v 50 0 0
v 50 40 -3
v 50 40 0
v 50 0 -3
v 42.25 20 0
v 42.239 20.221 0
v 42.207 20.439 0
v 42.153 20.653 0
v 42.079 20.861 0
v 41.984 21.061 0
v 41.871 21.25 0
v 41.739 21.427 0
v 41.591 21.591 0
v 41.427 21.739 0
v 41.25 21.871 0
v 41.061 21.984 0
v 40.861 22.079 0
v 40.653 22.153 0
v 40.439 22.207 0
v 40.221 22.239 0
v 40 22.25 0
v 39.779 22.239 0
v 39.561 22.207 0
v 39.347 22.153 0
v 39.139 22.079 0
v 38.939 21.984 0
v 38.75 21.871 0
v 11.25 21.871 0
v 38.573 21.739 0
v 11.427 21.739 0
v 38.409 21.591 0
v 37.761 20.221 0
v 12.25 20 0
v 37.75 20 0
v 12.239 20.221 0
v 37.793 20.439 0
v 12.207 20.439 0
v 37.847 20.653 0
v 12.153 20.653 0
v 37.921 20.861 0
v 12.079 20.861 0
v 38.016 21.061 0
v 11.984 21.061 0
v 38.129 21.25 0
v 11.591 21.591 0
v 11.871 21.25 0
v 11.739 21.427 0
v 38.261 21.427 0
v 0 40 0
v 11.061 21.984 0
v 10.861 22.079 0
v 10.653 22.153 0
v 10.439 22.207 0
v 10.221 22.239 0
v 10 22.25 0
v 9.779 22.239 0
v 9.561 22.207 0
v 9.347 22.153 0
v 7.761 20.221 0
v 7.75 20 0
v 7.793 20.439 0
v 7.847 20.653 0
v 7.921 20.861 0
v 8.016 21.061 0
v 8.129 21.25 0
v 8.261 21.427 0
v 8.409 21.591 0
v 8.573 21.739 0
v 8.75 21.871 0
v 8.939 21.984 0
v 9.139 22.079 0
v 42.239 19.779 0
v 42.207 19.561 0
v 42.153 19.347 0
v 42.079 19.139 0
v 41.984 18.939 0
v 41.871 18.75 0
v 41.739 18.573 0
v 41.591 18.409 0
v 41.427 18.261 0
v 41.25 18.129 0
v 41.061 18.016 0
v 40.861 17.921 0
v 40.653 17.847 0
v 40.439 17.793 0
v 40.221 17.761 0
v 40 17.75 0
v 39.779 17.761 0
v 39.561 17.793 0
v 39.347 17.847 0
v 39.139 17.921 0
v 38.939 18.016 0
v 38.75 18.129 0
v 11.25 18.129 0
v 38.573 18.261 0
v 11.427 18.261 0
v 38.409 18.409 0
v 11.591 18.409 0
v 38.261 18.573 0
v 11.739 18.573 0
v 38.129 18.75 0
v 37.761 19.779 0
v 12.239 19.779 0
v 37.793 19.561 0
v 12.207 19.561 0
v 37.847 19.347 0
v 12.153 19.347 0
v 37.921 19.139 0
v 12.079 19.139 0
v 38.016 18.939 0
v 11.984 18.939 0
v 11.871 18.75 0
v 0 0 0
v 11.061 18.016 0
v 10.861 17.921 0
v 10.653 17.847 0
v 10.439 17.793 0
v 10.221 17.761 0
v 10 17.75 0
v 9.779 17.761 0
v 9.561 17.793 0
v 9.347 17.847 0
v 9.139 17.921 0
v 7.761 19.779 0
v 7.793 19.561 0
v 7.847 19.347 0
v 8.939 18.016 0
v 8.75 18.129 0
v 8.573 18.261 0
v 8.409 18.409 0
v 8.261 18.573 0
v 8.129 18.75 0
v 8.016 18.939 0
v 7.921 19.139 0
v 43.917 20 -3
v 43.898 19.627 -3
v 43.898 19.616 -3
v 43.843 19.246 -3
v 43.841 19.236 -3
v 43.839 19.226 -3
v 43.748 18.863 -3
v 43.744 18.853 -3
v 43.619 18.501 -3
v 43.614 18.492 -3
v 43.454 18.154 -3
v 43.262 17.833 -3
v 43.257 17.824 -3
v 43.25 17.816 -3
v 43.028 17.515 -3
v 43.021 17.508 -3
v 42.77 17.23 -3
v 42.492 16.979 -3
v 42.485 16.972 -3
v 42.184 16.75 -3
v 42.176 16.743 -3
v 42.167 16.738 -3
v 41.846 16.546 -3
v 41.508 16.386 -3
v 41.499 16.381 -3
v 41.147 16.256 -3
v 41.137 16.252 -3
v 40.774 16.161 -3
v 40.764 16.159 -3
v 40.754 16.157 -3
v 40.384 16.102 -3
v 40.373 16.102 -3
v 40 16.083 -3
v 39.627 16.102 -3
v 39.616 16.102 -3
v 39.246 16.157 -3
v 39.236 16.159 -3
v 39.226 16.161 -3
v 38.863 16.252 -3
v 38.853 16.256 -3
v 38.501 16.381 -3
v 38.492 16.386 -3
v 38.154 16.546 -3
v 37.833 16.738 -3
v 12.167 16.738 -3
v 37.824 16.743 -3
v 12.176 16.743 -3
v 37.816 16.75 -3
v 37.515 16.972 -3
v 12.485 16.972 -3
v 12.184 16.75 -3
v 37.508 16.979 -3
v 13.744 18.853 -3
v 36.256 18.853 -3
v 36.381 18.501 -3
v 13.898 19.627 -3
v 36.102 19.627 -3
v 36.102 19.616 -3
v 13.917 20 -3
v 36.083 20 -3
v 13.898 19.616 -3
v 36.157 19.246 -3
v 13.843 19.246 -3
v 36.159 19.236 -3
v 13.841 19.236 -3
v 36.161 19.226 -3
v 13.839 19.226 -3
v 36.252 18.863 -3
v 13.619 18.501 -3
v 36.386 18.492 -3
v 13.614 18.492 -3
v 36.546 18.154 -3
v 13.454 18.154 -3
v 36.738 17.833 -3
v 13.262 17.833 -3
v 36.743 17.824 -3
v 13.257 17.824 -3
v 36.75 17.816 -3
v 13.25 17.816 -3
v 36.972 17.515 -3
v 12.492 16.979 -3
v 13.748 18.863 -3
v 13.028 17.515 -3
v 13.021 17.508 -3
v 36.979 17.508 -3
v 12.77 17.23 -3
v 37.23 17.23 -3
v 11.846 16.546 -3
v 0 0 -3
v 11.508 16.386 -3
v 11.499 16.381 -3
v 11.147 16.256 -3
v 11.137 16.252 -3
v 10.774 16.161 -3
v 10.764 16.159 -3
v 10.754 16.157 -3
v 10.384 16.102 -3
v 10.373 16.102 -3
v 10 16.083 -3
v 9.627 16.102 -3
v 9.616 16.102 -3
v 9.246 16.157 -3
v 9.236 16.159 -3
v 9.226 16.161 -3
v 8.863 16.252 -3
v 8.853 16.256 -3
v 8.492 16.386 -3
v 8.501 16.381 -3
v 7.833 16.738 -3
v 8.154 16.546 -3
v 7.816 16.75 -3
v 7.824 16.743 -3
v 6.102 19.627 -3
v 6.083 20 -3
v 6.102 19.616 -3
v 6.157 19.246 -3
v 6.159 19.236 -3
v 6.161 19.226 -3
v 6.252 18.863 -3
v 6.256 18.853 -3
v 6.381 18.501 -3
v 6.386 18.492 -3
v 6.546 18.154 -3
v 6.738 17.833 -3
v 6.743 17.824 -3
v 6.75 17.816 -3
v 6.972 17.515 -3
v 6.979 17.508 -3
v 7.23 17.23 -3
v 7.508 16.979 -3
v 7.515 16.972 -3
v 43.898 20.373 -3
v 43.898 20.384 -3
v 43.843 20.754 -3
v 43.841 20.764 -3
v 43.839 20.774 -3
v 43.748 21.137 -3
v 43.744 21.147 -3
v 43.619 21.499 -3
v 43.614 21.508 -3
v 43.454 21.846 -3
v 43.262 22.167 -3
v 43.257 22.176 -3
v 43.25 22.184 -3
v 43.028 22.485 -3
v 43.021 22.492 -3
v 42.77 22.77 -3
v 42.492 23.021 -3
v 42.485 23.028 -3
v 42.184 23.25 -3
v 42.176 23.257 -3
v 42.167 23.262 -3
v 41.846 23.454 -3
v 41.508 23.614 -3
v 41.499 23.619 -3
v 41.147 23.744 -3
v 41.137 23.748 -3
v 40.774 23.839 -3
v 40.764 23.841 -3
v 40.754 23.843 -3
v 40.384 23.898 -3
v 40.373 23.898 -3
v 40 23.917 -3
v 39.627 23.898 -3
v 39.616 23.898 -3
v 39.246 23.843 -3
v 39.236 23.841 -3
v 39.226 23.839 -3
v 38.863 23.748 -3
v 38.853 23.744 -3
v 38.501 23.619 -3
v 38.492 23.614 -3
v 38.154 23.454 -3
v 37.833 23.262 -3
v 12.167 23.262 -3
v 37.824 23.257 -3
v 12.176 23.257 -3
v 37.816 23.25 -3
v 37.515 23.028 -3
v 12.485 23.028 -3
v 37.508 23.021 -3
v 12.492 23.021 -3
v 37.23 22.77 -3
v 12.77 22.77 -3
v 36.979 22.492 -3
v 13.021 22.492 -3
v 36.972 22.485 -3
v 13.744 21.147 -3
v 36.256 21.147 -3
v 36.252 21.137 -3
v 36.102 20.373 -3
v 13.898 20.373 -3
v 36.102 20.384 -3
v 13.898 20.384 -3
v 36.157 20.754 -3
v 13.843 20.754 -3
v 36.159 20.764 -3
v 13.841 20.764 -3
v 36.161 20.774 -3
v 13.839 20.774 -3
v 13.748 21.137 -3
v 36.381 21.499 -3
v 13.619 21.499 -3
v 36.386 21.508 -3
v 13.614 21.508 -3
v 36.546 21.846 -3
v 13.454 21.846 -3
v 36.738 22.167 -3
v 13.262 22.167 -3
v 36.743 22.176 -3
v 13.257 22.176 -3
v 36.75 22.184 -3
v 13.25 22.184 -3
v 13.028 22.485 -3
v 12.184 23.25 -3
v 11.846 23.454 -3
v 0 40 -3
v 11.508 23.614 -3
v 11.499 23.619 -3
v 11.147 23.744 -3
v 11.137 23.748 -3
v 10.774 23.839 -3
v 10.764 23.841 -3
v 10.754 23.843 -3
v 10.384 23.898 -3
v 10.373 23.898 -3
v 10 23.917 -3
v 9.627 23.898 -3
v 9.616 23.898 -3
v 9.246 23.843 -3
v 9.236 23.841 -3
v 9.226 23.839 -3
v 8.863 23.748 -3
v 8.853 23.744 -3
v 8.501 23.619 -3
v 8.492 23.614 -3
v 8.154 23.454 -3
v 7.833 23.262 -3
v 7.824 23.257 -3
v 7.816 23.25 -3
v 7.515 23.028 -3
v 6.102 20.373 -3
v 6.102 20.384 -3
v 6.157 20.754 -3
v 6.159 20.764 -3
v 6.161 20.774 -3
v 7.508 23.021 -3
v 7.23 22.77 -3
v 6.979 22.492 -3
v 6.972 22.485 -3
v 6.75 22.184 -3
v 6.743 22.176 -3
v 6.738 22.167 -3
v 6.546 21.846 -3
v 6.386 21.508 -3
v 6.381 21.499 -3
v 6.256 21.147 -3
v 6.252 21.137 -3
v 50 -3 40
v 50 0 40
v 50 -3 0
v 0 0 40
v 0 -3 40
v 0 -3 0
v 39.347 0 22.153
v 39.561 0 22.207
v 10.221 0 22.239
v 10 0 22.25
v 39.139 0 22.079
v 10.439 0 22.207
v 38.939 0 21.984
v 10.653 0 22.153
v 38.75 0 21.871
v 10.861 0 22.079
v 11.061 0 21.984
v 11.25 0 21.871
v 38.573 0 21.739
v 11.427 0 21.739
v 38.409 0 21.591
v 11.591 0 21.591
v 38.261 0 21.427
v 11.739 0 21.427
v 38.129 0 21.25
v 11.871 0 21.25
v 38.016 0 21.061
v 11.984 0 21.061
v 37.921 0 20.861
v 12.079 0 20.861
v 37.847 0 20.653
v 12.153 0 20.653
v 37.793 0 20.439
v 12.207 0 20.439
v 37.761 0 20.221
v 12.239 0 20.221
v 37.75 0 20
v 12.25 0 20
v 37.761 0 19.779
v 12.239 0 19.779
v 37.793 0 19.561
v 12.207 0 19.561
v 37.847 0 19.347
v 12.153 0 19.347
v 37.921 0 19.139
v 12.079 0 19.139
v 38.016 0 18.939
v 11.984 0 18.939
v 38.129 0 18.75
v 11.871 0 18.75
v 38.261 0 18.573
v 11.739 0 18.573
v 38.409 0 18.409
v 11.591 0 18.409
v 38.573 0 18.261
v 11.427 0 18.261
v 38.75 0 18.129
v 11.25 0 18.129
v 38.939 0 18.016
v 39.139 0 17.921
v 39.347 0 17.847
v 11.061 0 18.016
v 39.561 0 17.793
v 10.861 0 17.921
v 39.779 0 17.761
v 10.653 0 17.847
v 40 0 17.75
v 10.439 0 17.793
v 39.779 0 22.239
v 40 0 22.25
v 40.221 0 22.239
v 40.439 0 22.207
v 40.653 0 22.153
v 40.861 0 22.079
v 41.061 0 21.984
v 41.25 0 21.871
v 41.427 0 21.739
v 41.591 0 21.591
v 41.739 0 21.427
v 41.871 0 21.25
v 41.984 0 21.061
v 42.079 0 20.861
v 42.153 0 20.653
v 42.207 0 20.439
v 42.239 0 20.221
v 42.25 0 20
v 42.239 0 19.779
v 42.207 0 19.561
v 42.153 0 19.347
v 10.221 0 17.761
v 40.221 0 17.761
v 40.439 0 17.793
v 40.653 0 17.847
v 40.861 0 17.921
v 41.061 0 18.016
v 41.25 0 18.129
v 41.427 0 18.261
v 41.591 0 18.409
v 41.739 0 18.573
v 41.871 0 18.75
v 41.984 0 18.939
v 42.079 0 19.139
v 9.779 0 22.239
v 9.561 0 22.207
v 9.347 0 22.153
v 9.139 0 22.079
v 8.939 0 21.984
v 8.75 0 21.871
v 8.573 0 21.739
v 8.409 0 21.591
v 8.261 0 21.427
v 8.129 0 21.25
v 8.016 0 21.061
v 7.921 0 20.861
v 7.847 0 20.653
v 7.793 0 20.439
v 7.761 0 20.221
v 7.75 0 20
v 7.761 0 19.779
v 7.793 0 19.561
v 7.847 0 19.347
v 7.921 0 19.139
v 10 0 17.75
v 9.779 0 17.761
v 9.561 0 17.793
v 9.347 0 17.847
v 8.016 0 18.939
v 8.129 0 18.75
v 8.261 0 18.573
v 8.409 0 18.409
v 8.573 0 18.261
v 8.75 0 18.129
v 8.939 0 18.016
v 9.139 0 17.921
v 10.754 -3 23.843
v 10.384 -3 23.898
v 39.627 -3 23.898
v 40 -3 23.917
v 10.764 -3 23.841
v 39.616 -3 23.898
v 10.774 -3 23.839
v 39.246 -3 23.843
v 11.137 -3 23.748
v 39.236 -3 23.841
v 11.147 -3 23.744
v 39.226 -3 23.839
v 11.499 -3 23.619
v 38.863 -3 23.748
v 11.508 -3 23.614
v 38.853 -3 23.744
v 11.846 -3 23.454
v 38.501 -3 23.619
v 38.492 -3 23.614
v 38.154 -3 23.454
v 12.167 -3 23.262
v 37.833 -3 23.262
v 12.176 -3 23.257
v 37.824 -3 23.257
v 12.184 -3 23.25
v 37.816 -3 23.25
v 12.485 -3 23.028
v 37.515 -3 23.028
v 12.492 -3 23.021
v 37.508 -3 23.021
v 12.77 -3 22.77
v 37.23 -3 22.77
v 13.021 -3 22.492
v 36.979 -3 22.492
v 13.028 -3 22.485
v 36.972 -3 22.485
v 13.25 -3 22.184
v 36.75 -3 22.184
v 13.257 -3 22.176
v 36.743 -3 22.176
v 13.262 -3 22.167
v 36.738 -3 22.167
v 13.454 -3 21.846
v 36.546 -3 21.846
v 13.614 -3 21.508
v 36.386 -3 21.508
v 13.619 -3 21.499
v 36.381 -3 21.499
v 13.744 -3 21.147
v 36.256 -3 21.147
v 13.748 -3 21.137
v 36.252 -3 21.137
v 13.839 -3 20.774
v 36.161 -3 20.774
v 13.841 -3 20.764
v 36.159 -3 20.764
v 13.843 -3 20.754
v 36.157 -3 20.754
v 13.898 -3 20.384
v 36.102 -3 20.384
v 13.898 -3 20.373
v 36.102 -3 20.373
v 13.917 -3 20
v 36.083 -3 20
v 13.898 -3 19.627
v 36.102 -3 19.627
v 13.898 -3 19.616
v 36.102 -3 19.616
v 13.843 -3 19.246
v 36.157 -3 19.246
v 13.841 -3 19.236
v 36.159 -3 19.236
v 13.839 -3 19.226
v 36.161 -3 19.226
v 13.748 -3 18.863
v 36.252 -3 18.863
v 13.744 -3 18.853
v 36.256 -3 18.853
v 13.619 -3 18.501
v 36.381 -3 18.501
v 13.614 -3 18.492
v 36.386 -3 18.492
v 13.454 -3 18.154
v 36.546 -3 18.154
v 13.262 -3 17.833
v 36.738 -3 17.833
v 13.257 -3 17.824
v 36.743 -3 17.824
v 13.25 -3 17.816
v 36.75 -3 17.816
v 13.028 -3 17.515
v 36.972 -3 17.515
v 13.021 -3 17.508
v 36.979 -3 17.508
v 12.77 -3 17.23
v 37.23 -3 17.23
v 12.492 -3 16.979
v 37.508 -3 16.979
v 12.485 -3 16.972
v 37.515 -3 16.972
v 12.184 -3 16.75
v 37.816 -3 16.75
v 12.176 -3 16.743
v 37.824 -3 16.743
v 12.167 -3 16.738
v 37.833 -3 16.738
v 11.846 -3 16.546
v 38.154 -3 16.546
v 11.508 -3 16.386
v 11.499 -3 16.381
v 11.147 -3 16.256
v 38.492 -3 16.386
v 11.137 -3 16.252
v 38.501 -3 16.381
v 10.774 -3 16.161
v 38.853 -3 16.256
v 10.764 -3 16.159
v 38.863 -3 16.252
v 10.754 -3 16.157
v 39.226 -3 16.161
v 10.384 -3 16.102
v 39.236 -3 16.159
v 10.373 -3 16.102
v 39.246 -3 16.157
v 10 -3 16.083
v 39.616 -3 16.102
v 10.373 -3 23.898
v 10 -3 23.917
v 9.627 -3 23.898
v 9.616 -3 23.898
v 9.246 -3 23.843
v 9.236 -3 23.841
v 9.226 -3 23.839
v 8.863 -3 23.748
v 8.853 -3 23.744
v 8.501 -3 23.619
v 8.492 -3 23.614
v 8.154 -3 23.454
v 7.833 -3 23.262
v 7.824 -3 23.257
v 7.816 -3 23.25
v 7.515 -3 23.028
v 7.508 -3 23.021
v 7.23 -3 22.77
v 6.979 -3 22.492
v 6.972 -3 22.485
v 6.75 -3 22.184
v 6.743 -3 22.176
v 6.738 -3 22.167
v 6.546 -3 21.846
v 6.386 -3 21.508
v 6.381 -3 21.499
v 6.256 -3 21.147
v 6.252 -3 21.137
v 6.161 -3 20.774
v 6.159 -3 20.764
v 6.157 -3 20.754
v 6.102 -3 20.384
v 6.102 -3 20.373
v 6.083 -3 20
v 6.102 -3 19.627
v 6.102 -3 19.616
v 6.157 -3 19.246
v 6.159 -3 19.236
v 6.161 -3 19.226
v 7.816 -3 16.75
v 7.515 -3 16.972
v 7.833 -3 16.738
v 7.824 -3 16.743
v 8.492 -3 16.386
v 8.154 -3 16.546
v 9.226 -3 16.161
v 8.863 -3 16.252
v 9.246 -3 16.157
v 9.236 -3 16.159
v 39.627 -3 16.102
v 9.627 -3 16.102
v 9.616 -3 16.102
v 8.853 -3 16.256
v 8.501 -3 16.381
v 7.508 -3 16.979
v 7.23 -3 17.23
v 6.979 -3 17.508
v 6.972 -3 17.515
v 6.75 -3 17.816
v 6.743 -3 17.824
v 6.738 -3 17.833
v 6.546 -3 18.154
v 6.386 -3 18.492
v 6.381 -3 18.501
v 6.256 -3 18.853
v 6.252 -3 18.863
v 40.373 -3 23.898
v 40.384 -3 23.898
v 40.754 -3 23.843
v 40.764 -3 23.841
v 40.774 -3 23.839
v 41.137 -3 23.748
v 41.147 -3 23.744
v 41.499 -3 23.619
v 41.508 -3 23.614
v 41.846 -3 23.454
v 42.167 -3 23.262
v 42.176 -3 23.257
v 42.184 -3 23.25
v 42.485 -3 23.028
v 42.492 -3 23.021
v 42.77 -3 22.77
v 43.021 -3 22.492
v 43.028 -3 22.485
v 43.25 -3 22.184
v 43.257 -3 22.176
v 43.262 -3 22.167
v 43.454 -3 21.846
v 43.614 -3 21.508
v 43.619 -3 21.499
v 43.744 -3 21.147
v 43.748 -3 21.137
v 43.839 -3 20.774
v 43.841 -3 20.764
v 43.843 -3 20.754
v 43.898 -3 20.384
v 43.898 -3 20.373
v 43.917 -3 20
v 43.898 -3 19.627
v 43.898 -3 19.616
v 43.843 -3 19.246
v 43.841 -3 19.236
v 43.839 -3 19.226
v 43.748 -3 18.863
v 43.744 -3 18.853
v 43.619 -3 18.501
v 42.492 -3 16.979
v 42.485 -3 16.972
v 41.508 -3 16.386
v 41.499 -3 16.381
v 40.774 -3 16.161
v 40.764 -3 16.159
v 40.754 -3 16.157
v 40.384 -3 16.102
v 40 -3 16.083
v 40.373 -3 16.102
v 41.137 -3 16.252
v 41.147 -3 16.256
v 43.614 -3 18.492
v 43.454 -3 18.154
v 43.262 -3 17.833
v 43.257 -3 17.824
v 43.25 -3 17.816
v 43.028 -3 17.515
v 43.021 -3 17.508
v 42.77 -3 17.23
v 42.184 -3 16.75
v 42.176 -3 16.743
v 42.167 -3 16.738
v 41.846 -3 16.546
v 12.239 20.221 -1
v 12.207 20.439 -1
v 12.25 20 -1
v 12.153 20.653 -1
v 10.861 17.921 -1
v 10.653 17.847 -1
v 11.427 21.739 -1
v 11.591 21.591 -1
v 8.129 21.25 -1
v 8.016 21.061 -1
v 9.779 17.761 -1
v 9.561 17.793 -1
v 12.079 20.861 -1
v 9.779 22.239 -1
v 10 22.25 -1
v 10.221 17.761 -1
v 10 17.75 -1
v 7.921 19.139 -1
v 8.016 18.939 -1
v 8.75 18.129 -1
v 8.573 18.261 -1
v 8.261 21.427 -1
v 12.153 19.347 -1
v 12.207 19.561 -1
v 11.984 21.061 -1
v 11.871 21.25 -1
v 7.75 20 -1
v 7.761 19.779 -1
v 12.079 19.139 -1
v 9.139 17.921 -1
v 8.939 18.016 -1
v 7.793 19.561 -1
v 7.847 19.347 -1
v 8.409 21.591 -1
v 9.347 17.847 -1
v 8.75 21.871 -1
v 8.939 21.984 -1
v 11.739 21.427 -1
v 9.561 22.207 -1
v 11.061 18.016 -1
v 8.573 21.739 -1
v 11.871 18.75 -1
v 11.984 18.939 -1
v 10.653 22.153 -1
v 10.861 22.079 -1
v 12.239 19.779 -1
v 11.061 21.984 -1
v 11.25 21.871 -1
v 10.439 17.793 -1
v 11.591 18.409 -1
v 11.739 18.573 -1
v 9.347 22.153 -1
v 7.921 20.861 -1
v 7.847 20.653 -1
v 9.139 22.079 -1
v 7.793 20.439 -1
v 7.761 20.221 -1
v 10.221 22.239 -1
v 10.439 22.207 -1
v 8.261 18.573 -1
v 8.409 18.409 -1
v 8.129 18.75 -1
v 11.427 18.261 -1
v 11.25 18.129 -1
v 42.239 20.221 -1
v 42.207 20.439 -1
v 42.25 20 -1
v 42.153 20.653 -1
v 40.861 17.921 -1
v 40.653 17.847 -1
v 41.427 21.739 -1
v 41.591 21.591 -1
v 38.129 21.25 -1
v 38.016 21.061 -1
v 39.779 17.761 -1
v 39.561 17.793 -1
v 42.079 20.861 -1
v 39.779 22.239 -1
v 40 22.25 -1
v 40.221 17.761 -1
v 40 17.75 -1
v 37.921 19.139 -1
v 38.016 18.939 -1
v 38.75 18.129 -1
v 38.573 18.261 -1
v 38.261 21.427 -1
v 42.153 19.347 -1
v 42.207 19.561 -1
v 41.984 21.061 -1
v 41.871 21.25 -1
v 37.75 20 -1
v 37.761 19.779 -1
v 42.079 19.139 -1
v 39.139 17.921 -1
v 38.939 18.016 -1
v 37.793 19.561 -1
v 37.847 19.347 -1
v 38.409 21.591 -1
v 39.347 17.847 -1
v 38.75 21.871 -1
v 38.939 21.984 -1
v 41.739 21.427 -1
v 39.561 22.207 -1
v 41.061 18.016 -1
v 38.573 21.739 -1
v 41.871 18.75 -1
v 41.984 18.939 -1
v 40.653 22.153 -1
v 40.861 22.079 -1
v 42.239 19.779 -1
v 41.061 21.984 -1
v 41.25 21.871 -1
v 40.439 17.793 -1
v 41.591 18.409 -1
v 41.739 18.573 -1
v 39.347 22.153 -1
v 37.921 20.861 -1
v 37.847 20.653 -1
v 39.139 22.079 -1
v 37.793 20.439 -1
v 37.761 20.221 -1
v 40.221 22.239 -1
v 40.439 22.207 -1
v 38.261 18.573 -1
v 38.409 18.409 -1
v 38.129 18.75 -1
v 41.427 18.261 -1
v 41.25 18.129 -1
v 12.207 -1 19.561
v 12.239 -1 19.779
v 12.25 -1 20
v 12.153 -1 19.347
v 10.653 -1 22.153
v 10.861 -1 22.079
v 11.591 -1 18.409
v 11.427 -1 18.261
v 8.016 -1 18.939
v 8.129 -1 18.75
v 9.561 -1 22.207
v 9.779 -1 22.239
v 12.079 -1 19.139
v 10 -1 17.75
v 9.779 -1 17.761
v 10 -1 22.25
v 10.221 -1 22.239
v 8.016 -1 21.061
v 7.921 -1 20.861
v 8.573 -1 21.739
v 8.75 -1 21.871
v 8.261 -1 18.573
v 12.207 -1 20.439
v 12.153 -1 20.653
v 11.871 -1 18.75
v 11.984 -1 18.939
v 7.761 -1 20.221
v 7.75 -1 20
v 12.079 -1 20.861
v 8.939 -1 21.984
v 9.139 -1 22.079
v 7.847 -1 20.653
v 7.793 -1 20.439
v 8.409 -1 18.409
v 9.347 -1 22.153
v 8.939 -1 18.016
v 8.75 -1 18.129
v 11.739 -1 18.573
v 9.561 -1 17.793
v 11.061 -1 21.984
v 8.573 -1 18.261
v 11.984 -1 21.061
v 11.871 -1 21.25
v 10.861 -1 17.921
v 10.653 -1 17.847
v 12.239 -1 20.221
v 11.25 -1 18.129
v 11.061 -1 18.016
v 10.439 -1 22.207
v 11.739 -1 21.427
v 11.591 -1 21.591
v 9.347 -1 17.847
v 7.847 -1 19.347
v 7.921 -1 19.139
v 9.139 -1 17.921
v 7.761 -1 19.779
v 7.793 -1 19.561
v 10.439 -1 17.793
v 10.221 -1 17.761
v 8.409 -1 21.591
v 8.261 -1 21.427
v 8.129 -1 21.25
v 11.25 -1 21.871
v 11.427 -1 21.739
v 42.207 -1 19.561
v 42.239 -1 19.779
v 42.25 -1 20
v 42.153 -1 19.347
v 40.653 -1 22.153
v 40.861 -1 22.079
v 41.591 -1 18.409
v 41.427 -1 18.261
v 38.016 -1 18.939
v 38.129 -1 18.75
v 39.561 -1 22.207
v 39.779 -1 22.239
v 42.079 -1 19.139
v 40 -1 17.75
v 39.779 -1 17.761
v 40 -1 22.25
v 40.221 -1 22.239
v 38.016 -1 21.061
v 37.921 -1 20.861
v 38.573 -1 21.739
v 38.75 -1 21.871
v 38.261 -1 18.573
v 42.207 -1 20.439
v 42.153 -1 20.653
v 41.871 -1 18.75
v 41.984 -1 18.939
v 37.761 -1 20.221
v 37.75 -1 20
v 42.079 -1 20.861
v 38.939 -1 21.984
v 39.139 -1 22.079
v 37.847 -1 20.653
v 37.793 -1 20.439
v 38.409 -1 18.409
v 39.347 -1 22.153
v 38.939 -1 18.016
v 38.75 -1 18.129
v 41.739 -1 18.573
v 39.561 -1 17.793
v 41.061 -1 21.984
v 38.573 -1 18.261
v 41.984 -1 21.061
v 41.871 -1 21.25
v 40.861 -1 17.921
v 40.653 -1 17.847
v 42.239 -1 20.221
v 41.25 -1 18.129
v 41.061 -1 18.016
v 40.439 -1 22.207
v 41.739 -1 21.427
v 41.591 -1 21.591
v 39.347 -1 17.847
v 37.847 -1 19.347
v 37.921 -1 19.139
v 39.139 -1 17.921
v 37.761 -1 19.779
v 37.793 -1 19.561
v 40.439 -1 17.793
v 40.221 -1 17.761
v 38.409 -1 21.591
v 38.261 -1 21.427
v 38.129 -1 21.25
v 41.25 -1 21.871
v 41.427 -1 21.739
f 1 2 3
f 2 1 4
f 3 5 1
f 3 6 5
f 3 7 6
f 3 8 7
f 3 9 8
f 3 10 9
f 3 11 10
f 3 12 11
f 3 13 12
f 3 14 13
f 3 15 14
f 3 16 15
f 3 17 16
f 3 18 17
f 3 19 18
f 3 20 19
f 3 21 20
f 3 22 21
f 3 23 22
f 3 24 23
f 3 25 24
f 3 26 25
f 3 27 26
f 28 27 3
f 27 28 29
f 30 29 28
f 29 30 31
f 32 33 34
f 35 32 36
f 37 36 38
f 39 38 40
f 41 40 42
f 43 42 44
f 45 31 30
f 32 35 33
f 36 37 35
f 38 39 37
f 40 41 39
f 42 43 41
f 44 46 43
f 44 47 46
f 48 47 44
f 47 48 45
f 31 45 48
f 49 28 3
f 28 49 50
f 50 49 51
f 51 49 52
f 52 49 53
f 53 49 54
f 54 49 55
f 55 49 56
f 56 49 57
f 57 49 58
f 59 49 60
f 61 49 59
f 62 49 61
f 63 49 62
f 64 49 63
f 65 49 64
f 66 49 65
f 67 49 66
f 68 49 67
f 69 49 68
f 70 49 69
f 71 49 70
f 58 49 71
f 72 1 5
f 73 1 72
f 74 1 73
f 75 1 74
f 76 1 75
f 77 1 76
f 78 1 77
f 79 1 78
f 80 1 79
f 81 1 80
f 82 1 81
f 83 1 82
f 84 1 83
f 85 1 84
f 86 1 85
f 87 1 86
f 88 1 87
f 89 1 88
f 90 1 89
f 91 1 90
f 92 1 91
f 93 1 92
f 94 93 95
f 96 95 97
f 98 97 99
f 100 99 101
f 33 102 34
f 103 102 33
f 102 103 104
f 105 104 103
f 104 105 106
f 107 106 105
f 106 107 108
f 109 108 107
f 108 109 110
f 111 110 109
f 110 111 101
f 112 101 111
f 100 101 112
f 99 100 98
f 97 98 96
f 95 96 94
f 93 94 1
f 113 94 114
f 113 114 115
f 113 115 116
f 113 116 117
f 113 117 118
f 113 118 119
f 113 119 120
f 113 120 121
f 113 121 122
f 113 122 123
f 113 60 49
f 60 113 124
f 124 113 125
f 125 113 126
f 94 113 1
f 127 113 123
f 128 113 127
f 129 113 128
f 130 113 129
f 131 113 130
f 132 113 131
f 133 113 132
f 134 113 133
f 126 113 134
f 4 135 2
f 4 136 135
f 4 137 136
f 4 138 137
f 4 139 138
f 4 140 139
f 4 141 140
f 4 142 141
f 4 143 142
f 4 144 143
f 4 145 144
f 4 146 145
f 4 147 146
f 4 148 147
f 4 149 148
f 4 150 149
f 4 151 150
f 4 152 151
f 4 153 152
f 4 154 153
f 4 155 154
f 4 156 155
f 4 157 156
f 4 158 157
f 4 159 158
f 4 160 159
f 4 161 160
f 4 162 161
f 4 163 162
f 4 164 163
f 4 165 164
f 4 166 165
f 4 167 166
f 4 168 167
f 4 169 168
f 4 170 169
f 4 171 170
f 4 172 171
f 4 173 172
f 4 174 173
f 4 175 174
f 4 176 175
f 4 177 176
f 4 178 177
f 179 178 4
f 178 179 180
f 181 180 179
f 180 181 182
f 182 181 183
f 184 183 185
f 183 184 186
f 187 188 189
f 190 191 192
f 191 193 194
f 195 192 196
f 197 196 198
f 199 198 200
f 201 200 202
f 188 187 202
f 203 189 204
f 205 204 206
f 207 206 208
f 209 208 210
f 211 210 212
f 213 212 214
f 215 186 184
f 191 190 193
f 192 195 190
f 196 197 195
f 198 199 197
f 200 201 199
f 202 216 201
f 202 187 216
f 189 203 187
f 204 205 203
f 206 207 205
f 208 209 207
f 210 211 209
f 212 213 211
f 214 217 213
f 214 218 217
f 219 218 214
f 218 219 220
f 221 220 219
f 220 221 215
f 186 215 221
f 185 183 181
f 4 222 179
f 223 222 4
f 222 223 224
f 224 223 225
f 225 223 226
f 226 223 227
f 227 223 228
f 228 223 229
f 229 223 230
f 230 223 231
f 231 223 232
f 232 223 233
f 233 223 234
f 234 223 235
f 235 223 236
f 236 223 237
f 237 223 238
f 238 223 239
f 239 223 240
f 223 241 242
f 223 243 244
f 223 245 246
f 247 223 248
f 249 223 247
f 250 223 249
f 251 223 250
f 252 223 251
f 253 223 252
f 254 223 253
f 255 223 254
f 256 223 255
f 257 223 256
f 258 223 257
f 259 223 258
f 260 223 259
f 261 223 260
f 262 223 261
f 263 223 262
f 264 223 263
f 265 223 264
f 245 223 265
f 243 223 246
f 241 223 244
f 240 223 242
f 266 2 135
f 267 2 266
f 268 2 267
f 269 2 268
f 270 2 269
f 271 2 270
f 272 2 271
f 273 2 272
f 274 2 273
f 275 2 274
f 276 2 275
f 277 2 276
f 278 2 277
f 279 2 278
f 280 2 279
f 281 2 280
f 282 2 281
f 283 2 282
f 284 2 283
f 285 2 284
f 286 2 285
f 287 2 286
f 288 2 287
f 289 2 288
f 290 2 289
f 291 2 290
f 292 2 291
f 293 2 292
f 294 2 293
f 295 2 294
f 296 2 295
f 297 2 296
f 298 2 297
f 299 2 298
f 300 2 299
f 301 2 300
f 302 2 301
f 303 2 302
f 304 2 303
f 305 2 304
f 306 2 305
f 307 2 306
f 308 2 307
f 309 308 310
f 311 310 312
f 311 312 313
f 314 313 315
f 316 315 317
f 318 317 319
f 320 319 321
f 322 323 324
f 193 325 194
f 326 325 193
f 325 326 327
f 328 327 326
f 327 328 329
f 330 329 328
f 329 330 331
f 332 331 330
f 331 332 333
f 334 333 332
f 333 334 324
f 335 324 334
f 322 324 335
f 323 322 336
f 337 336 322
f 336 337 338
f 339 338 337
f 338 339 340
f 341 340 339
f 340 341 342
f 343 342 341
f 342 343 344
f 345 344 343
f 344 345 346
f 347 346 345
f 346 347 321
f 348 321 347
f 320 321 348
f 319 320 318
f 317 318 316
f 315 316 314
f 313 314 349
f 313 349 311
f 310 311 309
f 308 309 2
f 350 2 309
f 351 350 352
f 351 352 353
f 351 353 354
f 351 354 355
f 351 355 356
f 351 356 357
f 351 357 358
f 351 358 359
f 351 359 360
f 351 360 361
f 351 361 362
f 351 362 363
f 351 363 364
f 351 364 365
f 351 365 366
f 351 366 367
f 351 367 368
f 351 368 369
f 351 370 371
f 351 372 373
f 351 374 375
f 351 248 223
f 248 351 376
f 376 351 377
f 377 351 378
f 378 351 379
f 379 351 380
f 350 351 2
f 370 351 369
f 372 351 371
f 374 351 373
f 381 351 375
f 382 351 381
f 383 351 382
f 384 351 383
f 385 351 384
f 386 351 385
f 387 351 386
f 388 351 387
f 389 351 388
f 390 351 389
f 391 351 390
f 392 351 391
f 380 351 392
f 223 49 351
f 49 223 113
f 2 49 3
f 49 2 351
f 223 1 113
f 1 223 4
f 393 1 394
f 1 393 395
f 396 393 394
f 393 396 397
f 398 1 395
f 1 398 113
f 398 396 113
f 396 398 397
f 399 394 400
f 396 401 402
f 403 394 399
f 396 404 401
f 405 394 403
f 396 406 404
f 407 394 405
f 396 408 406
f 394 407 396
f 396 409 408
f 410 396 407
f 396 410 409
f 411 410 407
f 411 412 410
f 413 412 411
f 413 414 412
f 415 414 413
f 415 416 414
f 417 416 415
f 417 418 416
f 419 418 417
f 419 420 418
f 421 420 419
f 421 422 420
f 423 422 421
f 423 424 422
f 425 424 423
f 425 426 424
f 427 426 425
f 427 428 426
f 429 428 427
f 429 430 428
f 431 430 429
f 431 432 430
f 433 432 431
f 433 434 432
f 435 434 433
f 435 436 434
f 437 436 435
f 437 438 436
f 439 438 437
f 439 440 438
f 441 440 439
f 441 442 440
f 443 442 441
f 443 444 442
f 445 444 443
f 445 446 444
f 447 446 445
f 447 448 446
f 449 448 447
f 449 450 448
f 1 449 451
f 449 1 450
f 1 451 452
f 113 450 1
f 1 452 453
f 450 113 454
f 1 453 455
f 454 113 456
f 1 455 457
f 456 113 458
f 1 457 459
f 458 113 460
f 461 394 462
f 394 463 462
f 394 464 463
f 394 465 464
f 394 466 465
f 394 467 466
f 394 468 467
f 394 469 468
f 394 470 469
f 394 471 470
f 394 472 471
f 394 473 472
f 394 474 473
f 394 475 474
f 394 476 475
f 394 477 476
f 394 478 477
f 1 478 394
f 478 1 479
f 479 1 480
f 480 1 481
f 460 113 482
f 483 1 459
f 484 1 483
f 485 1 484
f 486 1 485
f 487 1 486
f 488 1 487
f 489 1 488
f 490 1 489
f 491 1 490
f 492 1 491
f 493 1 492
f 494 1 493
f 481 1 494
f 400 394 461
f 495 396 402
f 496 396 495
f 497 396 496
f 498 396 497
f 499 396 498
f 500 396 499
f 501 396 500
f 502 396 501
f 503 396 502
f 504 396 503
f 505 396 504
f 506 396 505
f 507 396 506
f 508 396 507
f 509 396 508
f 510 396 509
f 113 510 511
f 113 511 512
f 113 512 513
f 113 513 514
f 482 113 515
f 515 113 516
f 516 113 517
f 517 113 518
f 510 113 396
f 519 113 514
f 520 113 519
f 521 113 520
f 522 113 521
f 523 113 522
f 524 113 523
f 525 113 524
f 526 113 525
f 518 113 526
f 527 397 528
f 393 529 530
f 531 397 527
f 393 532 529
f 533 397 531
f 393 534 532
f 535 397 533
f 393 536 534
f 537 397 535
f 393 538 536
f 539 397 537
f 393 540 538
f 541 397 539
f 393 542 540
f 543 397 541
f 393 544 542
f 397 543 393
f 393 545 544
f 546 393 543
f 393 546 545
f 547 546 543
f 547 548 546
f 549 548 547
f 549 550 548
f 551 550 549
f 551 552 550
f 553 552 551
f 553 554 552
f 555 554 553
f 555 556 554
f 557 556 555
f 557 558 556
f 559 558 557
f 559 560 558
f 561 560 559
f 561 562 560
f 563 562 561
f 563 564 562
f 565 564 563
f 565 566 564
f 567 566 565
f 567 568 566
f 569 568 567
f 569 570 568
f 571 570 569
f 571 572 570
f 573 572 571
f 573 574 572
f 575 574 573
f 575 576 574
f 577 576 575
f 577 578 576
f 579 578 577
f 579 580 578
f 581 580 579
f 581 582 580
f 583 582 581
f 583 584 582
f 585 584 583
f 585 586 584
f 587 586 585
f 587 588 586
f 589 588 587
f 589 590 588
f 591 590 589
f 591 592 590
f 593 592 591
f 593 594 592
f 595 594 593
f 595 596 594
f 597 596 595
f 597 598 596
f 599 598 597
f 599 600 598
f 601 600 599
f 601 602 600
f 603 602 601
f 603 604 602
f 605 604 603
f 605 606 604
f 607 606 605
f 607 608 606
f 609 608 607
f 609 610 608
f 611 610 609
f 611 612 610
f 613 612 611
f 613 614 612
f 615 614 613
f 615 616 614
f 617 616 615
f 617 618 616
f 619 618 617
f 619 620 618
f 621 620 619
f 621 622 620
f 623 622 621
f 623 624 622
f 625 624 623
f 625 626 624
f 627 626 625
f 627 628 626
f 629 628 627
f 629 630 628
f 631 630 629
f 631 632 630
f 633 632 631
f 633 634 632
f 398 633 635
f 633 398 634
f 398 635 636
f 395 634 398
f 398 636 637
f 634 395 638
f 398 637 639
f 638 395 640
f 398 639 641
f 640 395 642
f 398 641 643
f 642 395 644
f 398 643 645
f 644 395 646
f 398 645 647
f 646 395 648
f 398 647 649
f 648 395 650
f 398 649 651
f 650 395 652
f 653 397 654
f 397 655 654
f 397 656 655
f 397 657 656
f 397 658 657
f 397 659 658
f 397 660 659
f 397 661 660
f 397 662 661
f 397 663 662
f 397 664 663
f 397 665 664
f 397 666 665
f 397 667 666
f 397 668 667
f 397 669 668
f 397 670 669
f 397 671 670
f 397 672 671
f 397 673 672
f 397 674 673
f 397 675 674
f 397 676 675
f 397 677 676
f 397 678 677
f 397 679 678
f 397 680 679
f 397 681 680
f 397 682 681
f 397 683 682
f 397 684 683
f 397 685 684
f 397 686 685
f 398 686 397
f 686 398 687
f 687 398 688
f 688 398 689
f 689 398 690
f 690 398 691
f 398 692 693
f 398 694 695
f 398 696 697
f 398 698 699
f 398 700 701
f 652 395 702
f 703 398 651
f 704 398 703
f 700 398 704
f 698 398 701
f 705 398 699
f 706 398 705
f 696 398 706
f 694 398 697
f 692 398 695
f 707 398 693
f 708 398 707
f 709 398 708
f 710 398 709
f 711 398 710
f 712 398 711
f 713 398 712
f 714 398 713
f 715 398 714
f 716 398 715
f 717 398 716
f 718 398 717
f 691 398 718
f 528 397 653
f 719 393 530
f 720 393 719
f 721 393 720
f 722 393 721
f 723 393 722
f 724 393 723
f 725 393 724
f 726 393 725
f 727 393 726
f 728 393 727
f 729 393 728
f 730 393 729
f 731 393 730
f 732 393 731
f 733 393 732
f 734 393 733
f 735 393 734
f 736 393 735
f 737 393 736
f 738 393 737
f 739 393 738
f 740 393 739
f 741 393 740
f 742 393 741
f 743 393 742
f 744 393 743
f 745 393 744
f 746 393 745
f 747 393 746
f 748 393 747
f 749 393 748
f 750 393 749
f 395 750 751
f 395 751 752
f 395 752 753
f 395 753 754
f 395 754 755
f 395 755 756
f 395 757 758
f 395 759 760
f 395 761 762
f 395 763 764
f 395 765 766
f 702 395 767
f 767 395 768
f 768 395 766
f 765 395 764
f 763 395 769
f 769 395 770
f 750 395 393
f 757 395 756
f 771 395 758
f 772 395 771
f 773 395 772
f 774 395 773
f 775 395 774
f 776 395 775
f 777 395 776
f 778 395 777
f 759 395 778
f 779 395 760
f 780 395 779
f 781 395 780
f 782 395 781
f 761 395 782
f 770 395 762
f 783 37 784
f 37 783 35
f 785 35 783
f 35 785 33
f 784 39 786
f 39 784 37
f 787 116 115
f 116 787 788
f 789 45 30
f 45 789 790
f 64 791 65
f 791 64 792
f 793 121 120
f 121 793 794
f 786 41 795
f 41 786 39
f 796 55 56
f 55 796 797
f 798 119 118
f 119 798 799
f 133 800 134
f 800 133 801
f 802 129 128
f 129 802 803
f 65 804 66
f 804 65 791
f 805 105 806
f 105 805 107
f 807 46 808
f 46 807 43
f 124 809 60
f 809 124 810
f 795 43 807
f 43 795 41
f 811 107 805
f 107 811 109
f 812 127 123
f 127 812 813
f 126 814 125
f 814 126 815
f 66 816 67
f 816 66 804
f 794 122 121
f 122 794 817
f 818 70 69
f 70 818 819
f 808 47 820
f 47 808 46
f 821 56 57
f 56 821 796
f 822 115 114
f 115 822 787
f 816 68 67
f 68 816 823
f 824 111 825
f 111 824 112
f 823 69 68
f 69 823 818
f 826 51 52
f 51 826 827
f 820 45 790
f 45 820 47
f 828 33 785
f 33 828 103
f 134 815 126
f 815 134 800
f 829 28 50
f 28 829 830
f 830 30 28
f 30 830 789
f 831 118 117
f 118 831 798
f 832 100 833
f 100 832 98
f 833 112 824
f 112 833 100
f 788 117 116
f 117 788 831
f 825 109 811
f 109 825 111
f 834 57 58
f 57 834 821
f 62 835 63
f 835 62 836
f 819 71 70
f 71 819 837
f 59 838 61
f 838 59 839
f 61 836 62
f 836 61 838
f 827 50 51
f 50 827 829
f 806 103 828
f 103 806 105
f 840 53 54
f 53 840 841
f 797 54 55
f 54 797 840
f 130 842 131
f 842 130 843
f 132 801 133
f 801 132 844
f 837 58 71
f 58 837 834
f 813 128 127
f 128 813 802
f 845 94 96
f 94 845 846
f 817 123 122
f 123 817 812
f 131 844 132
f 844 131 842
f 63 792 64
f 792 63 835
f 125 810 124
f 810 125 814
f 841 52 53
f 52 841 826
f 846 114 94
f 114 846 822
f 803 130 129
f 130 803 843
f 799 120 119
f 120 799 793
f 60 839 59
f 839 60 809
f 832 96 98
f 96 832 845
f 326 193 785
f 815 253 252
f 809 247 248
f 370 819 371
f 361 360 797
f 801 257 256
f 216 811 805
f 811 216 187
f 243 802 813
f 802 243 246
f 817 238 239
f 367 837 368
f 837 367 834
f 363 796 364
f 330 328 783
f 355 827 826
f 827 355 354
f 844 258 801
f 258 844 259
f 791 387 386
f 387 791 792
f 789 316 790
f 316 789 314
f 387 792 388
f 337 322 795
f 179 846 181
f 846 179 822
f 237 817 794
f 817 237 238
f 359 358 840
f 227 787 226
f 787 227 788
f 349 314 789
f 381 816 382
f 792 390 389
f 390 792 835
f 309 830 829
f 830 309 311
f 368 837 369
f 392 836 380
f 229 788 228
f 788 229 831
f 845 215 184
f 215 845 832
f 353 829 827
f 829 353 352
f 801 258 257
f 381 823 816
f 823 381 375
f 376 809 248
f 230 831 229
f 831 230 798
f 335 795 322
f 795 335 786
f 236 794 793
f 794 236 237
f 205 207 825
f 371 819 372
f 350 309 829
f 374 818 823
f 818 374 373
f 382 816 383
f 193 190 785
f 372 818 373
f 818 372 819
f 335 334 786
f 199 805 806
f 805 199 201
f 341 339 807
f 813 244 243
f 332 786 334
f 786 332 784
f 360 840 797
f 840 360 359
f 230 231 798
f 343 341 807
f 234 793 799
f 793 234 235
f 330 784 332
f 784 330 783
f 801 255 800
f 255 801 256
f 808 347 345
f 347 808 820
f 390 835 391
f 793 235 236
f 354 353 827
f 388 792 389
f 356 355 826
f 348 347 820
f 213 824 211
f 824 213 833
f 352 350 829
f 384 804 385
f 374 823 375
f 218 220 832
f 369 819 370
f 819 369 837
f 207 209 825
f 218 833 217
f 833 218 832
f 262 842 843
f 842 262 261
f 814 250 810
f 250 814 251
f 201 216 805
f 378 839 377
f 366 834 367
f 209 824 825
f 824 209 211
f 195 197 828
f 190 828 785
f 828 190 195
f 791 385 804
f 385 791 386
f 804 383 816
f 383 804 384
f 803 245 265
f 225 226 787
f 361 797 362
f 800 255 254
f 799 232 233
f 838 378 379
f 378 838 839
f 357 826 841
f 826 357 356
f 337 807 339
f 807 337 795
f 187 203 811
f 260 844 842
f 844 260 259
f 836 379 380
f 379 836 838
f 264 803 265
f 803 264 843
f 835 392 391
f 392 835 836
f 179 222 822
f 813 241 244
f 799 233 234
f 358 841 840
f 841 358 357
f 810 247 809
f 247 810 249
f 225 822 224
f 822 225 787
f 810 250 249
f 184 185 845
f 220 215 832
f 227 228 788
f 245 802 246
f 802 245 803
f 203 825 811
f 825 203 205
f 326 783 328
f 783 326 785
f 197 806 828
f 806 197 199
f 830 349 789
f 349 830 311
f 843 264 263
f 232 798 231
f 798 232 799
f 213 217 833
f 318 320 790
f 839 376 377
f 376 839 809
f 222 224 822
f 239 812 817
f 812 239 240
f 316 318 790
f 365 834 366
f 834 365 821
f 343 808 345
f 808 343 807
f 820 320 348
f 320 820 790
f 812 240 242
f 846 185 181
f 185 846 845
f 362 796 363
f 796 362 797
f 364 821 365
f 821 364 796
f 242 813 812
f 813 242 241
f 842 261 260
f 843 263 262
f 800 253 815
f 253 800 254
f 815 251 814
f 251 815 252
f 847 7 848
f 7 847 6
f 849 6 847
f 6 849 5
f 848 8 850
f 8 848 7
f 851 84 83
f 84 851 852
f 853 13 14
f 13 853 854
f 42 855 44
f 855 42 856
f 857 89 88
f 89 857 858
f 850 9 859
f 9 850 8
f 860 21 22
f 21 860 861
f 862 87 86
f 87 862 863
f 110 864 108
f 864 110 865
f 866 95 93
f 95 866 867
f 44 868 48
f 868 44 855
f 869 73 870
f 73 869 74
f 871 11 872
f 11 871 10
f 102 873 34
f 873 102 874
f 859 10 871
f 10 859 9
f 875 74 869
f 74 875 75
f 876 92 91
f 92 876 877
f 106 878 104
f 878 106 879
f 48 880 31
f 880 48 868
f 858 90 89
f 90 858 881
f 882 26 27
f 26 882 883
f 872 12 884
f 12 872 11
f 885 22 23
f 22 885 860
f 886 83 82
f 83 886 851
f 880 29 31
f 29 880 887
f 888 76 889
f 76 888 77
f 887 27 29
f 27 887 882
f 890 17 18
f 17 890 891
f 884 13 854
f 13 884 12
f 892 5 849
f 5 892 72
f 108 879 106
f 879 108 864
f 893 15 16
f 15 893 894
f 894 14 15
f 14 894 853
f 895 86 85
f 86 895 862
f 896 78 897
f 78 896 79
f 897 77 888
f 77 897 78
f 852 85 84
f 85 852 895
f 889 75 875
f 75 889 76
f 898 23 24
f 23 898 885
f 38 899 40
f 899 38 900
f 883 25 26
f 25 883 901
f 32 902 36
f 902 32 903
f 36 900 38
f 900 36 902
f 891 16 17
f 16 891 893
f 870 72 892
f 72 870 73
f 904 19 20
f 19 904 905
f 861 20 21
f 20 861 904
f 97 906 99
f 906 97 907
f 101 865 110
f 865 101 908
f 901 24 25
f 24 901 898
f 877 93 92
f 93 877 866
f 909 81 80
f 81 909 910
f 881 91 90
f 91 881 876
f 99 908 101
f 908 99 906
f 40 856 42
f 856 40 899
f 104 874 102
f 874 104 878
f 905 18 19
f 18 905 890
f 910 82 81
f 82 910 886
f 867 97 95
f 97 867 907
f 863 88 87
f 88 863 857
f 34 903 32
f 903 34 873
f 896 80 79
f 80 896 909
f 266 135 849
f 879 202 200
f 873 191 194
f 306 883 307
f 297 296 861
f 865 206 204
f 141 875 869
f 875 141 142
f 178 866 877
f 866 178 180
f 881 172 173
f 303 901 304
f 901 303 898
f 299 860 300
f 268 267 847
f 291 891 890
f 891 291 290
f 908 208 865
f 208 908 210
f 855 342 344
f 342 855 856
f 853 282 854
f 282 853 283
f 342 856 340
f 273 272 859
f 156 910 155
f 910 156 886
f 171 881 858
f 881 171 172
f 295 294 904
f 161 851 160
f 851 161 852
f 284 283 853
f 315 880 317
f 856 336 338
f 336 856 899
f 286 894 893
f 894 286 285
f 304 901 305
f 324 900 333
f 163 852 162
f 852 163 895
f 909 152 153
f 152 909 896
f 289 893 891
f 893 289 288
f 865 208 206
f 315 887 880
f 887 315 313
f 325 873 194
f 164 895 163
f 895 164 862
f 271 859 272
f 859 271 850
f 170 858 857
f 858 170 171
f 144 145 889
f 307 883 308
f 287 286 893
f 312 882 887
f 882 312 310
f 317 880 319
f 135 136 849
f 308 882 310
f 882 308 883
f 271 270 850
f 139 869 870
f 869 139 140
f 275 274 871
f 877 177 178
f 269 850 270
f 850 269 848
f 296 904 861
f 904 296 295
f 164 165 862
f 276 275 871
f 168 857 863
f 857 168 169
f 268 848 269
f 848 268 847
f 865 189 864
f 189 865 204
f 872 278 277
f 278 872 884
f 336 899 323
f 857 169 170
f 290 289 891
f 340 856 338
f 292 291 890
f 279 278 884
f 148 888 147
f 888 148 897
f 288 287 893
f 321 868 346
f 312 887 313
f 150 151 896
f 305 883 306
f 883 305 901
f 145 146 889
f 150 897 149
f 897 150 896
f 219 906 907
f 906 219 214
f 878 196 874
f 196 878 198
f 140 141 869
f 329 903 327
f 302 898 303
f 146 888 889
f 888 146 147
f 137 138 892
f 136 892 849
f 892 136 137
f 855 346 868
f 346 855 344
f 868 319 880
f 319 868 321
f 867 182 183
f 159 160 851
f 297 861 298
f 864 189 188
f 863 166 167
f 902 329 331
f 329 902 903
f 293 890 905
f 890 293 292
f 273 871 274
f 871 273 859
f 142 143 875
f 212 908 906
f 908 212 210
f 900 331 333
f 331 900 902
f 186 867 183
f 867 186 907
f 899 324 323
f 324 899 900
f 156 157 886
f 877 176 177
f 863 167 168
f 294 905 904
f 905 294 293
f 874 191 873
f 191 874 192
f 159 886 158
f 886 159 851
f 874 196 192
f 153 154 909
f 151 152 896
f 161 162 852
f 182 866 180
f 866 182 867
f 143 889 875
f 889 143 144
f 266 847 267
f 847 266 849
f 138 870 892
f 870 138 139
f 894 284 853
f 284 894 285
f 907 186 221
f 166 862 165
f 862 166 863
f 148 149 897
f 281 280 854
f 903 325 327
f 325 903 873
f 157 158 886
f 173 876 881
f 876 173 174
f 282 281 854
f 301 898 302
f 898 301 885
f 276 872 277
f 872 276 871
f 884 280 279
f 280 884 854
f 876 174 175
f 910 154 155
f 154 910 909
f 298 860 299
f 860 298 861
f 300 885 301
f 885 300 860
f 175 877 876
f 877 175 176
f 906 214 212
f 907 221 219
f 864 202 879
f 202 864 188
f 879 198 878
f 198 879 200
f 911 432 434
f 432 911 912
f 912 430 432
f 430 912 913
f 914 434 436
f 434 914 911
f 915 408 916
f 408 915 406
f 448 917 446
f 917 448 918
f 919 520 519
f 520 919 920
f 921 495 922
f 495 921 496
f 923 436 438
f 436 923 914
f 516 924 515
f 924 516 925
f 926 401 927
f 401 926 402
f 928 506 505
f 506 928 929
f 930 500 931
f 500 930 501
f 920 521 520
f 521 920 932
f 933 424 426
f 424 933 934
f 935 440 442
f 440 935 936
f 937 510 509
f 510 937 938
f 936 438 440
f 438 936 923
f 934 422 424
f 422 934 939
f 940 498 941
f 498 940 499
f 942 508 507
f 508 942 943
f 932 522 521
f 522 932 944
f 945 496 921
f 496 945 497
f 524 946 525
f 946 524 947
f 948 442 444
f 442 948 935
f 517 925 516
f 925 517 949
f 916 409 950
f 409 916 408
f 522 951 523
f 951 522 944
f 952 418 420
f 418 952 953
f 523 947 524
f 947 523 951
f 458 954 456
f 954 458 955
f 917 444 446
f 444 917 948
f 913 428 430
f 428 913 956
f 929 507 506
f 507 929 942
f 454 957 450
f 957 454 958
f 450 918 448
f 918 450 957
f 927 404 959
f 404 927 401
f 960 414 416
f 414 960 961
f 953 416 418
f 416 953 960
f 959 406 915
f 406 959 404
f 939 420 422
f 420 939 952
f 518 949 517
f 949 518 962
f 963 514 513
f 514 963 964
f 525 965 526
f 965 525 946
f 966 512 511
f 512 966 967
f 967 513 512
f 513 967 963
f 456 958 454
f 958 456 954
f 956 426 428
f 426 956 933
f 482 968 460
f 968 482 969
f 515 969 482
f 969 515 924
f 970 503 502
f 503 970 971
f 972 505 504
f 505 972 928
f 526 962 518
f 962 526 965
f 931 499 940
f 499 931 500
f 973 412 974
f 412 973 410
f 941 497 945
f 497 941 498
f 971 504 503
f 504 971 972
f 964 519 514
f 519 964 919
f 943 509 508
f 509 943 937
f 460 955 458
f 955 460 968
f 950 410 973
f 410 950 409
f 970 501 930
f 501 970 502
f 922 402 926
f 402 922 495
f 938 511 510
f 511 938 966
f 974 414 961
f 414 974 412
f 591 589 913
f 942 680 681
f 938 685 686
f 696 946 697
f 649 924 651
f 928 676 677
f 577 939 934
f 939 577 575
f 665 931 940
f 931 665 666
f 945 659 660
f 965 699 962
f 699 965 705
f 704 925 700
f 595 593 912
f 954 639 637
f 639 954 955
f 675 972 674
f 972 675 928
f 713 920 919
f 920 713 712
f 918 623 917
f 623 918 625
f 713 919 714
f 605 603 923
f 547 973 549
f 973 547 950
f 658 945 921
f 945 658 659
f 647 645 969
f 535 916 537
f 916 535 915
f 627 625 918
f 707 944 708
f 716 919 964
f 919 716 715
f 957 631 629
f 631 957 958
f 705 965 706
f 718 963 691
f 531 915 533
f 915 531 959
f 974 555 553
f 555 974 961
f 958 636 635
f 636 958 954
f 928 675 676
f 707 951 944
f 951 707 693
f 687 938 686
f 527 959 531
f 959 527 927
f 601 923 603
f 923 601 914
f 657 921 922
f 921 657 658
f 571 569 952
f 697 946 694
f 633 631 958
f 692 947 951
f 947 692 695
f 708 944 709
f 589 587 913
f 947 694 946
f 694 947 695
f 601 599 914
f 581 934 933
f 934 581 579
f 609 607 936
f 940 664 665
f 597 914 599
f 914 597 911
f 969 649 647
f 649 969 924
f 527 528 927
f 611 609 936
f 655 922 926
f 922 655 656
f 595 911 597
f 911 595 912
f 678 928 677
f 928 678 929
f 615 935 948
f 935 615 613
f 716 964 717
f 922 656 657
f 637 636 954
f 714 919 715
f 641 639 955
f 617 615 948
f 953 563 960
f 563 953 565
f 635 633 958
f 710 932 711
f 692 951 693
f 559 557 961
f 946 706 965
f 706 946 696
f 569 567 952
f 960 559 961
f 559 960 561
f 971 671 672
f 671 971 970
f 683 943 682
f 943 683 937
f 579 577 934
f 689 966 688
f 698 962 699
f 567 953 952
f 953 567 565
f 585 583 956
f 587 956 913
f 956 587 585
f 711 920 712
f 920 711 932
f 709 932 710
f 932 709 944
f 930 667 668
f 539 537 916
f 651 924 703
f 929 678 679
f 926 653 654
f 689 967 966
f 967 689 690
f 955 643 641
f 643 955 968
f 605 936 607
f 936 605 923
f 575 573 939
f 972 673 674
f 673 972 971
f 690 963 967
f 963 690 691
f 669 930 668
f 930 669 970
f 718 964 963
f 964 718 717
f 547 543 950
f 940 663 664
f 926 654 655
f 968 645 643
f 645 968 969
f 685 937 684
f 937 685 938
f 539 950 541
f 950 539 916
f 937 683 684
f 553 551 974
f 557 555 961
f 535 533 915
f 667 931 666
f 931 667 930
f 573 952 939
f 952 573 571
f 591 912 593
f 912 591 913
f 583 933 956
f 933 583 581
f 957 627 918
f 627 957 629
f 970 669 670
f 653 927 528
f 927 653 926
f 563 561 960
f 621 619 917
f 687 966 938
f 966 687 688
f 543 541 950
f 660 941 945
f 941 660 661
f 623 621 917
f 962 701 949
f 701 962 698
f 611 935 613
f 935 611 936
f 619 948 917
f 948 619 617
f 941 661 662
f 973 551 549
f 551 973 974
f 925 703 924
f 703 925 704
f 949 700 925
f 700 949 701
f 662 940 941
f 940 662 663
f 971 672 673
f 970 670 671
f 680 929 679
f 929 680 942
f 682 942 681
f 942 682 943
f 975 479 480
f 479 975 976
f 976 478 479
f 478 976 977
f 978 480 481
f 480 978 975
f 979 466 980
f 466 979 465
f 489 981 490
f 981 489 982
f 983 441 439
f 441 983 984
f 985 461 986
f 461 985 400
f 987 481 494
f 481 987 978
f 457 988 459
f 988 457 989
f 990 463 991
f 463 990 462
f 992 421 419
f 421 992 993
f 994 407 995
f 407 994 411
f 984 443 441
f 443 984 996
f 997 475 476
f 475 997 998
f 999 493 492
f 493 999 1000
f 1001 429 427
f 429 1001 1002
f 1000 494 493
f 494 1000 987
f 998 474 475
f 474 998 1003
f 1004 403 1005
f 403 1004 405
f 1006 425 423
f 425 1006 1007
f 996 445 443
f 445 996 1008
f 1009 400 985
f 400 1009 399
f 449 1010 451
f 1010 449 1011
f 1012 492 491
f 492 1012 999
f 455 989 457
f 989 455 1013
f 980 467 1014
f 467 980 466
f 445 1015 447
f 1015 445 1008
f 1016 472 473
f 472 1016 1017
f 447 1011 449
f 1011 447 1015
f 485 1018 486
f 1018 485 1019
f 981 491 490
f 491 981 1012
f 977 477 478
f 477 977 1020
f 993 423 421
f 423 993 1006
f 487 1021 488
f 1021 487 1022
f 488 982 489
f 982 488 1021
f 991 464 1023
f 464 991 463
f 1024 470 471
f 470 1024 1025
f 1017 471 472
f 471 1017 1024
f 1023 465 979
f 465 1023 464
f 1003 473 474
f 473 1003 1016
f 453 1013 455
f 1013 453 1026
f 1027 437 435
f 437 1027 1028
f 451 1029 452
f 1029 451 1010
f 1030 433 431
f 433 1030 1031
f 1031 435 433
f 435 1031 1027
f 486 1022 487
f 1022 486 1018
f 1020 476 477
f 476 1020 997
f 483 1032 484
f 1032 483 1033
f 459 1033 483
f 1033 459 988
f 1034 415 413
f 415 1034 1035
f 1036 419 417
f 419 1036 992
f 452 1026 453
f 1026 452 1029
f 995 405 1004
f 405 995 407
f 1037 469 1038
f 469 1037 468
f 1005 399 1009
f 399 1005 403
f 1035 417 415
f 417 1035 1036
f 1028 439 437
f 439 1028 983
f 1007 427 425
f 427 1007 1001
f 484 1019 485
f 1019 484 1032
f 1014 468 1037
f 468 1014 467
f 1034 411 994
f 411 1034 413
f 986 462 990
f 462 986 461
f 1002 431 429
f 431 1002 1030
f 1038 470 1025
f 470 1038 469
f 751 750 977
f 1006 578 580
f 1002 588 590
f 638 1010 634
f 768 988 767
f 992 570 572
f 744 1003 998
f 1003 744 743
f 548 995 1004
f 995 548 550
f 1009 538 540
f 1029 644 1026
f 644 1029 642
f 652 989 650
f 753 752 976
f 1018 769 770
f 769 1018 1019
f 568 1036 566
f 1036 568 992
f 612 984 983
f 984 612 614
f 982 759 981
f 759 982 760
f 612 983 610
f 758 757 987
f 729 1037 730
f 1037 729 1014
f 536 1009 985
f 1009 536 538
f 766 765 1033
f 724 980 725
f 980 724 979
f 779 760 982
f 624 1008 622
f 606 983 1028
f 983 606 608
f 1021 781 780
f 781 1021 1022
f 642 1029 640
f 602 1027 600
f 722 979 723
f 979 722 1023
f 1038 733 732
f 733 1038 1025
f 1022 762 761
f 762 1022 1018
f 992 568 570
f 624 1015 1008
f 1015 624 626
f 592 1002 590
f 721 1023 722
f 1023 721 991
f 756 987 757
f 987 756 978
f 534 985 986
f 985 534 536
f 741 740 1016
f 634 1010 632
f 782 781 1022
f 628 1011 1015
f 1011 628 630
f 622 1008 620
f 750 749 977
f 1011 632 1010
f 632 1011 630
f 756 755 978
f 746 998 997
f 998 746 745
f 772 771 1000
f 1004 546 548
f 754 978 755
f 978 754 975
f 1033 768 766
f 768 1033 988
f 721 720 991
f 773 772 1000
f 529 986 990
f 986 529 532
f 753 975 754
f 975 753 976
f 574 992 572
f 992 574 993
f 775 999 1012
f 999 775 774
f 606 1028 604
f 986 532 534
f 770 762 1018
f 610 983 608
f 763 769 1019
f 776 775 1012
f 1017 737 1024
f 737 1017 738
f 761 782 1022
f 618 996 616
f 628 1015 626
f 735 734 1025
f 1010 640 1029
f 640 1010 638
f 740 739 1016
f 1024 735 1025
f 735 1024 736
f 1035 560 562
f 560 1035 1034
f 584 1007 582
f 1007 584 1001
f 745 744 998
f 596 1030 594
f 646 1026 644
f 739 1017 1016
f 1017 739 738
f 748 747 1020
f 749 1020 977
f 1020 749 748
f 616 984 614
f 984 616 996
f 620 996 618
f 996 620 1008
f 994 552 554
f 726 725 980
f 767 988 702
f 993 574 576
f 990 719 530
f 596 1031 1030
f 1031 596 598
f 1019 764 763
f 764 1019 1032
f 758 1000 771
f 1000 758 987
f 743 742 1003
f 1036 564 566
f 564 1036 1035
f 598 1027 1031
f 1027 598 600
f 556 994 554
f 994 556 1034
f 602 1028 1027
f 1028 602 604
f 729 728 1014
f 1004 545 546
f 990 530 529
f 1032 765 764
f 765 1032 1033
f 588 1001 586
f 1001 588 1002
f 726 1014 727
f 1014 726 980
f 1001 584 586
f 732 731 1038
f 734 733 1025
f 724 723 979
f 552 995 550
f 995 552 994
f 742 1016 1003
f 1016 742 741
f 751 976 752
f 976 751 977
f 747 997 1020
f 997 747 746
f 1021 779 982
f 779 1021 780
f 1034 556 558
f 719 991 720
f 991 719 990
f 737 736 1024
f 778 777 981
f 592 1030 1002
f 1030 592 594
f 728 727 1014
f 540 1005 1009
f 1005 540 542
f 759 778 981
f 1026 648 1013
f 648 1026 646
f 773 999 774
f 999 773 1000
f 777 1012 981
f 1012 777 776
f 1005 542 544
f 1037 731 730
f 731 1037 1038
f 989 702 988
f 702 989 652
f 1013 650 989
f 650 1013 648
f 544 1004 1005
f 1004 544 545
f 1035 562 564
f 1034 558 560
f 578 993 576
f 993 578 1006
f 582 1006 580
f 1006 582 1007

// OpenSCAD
$fn = 64;

// ---- パラメータ ----
flange_w = 50;   // 幅(X方向)
flange_l = 40;   // 奥行き / 高さ
t        = 3;    // 板厚

hole_d   = 4.5;  // M4 貫通穴
cs_d     = 8;    // 皿座面 直径
cs_depth = 2;    // 皿座面 深さ
edge_off = 10;   // 縁からのオフセット
eps      = 0.1;  // 差分演算用の余裕

// 皿穴: +Z 方向に貫通、z=0 側(外側)に皿座面
module csk_hole(len = t) {
    // 貫通穴
    translate([0, 0, -eps])
        cylinder(d = hole_d, h = len + 2 * eps);
    // 皿座面(円錐)
    translate([0, 0, -eps])
        cylinder(d1 = cs_d, d2 = hole_d, h = cs_depth + eps);
}

difference() {
    union() {
        // 水平フランジ: +Y 方向に伸び、板厚は下側(-Z)
        translate([0, 0, -t])
            cube([flange_w, flange_l, t]);
        // 垂直フランジ: +Z 方向に伸び、板厚は背面側(-Y)
        translate([0, -t, 0])
            cube([flange_w, t, flange_l]);
    }

    // 水平フランジの皿穴(皿座面は下面=外側)
    for (x = [edge_off, flange_w - edge_off])
        translate([x, flange_l / 2, -t])
            csk_hole();

    // 垂直フランジの皿穴(皿座面は背面=外側)
    for (x = [edge_off, flange_w - edge_off])
        translate([x, -t, flange_l / 2])
            rotate([-90, 0, 0])
                csk_hole();
}
